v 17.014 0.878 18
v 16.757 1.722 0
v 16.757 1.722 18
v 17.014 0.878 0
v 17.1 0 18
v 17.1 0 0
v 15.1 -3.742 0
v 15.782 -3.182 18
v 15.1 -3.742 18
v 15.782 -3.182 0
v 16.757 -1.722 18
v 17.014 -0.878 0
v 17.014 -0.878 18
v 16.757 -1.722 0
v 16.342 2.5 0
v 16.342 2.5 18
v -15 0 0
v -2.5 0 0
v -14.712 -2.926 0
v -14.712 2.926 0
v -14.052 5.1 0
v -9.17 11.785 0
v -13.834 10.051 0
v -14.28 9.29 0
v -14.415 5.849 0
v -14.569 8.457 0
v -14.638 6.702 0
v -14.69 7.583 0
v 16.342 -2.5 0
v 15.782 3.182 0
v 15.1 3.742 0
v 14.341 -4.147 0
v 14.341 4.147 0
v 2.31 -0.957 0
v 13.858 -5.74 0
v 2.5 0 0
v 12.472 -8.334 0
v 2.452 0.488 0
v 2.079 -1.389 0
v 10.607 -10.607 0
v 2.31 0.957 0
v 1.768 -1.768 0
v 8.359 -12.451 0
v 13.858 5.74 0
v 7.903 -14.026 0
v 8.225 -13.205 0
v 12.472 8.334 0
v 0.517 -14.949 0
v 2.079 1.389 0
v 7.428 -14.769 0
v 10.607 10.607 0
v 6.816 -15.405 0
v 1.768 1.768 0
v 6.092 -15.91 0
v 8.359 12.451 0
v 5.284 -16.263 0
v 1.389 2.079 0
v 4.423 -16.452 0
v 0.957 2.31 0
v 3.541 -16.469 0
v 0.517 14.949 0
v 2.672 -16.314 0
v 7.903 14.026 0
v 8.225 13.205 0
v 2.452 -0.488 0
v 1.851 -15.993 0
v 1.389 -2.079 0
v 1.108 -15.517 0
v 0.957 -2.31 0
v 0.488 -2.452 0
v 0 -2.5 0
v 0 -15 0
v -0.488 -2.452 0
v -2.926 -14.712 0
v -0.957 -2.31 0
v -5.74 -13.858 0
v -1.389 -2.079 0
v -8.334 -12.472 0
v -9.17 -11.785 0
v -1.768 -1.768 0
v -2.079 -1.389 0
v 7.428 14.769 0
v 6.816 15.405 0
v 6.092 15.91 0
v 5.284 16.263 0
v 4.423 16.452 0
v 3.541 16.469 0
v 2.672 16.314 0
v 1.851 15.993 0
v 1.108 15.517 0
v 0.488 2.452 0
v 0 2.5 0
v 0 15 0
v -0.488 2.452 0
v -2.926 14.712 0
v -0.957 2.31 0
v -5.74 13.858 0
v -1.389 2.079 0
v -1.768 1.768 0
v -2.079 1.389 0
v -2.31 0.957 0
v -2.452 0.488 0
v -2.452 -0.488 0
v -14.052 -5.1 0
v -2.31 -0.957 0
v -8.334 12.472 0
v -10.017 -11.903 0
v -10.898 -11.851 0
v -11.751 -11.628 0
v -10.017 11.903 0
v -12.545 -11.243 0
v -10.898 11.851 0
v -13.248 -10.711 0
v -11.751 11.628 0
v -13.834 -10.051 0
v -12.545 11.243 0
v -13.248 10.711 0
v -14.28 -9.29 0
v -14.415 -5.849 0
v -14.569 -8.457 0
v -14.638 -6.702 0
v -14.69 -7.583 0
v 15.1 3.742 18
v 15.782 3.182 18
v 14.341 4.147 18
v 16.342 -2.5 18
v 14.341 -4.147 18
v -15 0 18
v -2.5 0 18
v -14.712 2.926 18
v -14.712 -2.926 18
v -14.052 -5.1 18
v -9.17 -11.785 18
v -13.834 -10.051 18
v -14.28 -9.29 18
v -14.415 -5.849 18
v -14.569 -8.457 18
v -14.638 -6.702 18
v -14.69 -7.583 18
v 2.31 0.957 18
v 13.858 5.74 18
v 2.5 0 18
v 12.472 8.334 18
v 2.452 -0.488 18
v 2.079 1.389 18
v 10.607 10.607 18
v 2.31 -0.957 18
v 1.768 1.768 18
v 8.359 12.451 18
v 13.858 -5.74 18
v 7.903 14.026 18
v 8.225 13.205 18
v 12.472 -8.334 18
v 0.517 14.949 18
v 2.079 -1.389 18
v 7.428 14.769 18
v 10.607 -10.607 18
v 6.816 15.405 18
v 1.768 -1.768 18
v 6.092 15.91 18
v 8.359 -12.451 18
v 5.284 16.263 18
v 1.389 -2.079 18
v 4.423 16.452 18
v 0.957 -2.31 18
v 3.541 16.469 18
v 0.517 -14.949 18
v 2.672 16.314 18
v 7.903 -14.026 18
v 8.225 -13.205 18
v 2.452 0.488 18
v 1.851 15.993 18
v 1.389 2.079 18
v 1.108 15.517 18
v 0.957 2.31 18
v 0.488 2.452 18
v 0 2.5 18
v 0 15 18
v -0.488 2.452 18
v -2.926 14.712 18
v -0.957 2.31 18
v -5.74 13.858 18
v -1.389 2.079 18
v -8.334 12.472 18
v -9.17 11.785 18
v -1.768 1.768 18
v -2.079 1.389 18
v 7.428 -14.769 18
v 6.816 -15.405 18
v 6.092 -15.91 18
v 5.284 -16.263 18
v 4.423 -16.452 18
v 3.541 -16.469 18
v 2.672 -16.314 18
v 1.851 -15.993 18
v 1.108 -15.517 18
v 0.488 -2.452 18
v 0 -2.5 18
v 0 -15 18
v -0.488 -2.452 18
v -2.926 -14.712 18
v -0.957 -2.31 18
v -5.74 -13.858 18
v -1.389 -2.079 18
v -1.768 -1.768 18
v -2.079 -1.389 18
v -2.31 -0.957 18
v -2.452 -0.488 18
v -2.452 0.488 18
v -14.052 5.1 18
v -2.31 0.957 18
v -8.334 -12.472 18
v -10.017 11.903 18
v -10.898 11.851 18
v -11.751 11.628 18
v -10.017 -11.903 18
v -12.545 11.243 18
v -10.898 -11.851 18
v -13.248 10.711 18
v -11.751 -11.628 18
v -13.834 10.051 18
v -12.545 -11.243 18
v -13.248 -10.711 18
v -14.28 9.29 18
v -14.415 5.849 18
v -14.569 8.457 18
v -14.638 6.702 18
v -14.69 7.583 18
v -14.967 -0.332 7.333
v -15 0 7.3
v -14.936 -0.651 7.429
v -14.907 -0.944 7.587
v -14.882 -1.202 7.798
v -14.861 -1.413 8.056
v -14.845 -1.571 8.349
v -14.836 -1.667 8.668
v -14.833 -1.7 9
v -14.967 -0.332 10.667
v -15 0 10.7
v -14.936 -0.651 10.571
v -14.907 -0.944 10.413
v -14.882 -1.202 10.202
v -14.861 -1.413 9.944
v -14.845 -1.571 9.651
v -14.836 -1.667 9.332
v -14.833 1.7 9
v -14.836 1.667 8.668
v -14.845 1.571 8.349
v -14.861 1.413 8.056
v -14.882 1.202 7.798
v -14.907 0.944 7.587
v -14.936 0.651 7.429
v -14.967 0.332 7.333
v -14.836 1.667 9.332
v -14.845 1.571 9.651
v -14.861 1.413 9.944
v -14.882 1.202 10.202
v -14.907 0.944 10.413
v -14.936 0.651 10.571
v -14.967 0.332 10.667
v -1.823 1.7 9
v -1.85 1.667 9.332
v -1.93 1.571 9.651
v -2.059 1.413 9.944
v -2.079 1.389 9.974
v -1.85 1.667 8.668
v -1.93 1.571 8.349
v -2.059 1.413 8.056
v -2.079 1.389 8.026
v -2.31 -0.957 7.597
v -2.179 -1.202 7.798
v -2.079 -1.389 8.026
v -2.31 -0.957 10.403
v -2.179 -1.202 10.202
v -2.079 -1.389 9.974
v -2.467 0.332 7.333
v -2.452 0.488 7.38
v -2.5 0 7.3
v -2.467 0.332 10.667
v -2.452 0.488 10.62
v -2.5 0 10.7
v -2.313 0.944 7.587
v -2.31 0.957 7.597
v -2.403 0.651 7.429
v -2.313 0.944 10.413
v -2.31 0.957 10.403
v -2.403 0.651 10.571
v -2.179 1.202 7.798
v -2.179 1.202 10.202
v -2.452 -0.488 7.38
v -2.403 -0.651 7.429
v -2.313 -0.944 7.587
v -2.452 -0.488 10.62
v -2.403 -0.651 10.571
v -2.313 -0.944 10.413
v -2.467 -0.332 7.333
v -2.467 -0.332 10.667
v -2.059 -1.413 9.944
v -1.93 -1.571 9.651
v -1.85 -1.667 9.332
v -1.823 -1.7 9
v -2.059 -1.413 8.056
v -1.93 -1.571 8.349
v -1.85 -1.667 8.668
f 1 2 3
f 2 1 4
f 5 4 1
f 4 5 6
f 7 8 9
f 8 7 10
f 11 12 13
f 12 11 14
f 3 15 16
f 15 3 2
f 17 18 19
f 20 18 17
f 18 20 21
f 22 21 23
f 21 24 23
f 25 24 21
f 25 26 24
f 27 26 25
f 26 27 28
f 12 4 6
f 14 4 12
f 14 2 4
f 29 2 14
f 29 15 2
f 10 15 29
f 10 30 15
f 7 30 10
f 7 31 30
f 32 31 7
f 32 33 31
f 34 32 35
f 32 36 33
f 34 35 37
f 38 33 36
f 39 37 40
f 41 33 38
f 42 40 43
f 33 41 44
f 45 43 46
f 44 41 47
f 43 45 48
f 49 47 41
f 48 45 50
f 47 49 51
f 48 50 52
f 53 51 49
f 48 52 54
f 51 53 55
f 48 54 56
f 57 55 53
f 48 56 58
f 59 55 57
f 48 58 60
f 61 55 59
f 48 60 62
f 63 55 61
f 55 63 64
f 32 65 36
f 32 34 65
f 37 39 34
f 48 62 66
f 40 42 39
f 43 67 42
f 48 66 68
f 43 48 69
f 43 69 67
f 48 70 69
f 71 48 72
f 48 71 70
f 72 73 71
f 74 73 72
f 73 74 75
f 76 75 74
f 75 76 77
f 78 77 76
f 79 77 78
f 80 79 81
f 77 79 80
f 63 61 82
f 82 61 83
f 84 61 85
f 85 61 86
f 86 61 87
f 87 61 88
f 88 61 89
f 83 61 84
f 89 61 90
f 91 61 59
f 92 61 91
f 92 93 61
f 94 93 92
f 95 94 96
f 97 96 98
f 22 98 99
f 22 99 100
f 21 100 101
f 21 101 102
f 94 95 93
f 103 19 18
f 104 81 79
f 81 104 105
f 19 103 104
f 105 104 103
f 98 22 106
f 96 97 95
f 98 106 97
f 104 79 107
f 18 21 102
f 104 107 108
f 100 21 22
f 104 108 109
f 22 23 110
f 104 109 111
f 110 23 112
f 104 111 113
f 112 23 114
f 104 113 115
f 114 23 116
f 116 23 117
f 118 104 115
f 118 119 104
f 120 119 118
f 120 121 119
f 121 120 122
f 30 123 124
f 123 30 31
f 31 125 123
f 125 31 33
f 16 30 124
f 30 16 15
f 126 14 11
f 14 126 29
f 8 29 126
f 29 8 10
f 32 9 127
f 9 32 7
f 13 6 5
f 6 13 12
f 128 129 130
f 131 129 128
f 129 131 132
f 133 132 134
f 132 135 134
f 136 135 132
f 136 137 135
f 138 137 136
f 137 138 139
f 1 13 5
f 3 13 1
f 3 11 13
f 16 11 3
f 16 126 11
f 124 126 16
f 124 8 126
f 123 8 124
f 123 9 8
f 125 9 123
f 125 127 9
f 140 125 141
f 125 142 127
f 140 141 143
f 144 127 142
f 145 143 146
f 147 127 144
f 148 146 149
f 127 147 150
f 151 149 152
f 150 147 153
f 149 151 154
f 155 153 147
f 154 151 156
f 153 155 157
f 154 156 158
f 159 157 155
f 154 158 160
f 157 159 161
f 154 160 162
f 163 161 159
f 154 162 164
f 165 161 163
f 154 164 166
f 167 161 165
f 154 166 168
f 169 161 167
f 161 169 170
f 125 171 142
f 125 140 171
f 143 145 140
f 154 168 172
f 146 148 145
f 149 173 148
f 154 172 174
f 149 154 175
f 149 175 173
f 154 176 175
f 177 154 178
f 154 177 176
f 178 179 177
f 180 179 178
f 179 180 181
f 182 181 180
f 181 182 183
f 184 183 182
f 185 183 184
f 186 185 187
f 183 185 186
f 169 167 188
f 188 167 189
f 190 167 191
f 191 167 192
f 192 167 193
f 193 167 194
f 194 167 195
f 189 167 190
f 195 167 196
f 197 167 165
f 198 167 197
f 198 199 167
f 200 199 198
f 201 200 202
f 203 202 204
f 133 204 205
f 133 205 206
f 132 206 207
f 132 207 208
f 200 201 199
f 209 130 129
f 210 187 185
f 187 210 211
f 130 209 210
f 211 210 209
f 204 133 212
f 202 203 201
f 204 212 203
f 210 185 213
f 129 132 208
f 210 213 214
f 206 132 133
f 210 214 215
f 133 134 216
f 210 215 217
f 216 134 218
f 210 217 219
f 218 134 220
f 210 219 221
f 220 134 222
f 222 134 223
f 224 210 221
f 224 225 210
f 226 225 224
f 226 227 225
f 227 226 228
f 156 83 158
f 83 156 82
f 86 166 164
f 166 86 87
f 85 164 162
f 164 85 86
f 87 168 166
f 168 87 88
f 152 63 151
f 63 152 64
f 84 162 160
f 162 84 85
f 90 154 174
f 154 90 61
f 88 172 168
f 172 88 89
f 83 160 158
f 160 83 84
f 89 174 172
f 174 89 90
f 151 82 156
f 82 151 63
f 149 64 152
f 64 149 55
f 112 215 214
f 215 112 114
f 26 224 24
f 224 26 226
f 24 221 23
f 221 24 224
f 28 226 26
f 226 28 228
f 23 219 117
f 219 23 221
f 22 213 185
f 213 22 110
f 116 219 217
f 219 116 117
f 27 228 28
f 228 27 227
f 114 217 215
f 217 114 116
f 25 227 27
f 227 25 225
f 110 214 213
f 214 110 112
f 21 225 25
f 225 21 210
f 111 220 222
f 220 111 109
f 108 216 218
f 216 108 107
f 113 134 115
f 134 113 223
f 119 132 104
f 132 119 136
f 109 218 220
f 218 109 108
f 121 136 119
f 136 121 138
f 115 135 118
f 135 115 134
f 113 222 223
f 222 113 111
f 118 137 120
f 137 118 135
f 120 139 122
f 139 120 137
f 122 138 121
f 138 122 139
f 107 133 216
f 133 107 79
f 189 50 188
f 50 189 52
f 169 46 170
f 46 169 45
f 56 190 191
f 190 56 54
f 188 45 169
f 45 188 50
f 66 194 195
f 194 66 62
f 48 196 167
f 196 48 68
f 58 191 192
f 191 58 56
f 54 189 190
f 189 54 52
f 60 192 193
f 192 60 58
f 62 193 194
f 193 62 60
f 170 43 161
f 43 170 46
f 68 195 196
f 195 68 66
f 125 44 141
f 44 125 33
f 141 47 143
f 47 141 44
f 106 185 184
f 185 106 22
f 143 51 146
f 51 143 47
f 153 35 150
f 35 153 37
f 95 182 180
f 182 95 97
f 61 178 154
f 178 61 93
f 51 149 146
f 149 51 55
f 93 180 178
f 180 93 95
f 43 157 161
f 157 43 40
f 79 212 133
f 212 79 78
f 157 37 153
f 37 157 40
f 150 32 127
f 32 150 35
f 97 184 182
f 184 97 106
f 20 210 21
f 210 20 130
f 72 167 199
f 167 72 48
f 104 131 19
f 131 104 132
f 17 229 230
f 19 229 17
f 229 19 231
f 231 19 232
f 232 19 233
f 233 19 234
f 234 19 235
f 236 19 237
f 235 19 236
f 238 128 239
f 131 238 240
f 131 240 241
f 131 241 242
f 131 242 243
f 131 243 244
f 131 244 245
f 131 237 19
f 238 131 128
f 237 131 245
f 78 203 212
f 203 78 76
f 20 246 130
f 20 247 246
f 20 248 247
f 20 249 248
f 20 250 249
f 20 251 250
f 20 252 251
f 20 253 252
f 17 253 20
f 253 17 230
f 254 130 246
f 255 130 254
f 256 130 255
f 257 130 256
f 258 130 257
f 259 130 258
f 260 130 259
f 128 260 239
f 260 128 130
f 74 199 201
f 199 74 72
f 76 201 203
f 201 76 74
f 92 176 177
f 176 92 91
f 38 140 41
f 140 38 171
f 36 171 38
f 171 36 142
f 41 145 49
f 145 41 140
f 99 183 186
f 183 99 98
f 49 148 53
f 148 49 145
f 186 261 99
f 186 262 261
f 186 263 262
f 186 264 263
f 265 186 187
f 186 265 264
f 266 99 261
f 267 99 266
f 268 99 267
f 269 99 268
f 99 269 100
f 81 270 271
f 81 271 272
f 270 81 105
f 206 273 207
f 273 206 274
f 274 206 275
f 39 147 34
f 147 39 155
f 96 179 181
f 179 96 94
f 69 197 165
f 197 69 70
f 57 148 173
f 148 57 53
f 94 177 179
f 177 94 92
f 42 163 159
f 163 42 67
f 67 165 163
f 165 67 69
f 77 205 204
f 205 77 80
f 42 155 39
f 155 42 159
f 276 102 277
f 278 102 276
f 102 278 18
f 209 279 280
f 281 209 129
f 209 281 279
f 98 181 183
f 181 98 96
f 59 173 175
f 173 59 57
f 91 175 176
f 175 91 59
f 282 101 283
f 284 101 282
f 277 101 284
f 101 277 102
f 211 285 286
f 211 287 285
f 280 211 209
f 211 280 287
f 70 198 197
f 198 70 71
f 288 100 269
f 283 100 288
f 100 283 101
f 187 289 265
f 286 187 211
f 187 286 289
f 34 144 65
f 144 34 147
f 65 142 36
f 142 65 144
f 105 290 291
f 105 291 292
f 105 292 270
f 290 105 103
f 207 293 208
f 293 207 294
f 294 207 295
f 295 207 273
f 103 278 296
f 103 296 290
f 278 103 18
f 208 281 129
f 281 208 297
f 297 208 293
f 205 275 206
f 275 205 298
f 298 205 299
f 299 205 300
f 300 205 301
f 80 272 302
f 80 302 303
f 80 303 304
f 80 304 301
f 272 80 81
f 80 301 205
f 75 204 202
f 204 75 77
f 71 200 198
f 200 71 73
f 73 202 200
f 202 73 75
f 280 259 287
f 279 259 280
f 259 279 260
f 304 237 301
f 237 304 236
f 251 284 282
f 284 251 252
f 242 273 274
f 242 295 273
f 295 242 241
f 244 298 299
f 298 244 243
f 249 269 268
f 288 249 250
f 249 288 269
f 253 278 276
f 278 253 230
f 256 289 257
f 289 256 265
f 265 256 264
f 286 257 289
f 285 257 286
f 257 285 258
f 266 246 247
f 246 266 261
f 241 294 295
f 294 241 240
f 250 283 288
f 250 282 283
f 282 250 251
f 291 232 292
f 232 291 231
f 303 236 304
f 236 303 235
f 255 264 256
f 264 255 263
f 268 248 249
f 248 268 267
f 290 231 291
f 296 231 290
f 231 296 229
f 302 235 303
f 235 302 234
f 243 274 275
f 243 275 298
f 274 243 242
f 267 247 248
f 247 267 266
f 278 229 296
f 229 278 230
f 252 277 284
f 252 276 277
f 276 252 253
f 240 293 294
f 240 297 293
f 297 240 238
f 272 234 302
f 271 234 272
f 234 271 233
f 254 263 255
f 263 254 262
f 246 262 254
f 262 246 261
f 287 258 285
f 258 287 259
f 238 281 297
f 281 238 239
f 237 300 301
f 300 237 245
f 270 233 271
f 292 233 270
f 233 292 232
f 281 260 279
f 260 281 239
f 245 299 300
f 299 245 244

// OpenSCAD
$fn = 32;

// ----------------------------------------------------------------------
// Hand knob: 30 x 30 x 18 mm
// ----------------------------------------------------------------------

// --- parameters (mm) ---
grip_d = 30;              // knob diameter
grip_h = 18;              // knob height
shaft_d = 5;              // shaft bore
set_d = 3.4;              // set screw tap hole
knurl_dia = 0.86;         // knurl groove diameter
lobes = 5;                // grip lobes

module body() {
  cylinder(h = grip_h, d = grip_d);
  for (i = [0 : lobes - 1])
    rotate([0, 0, i * 360 / lobes])
      translate([grip_d * 0.42, 0, 0])
        cylinder(h = grip_h, d = grip_d * 0.3);
}

difference() {
  union() {
    body();
  }
  translate([0, 0, -1]) cylinder(h = grip_h + 0 + 2, d = shaft_d);
  translate([-grip_d / 2 - 1, 0, grip_h * 0.5]) rotate([0, 90, 0]) cylinder(h = grip_d / 2 + 2, d = set_d);
}
